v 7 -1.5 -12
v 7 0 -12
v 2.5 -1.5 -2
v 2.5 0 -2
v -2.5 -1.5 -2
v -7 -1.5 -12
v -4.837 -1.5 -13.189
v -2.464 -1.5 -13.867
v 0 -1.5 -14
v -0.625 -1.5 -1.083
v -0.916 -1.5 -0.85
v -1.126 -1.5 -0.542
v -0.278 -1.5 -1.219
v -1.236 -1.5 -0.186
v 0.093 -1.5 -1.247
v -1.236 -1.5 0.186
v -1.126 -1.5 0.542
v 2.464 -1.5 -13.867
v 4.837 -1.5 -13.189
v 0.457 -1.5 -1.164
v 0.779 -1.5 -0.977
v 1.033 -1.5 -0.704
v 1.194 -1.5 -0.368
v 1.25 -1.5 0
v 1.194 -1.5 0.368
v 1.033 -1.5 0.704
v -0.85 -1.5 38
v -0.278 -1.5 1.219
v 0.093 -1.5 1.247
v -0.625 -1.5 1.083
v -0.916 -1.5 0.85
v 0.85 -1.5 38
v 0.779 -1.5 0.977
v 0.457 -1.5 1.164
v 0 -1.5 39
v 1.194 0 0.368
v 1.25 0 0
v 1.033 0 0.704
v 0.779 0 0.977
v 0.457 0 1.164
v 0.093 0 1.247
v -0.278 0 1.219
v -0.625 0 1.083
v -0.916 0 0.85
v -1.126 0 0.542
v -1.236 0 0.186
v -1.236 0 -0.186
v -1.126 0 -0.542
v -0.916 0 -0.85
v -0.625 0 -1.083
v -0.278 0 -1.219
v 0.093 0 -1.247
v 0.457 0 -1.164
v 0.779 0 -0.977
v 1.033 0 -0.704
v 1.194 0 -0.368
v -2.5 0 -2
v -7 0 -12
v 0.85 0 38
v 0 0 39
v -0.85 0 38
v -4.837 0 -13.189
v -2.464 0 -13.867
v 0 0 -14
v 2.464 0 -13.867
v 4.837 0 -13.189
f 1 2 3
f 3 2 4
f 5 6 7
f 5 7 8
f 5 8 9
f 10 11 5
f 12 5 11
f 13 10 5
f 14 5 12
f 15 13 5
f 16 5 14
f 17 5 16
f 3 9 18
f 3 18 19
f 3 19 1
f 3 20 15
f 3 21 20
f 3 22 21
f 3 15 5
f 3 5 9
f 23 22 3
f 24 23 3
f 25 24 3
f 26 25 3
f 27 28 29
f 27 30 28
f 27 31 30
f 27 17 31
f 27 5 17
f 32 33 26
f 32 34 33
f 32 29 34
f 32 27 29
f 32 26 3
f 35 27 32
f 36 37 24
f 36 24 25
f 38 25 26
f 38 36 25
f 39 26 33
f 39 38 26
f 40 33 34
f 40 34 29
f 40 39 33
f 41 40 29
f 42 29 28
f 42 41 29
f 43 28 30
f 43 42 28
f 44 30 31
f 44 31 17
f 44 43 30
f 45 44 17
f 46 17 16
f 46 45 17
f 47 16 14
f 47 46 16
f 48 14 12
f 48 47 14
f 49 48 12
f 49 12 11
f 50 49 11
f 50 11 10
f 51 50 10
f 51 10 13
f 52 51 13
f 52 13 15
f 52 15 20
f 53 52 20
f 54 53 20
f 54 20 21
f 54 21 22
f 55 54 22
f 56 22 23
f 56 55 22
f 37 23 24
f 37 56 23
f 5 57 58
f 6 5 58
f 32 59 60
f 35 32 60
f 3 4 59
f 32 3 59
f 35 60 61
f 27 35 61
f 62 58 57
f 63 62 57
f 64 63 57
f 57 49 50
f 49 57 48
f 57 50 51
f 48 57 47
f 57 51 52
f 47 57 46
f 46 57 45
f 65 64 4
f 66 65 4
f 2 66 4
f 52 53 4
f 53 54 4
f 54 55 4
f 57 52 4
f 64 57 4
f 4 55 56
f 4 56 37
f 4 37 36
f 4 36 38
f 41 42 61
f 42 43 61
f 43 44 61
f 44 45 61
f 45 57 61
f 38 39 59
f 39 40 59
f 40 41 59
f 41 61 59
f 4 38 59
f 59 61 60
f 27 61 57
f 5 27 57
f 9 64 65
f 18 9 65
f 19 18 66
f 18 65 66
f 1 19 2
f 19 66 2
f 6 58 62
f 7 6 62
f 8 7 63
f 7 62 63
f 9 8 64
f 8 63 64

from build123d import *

# Parameters (mm, degrees)
F0_R     = 1.25
F1_DEPTH = 1.5


with BuildPart() as f1:
    # F0 (on Front) → F1 (new body)
    with BuildSketch(Plane.XZ):
        with BuildLine():
            Line((0.85, 38), (0, 39))
            Line((0, 39), (-0.85, 38))
            Line((-0.85, 38), (-2.5, -2))
            Line((-2.5, -2), (-7, -12))
            ThreePointArc((-7, -12), (-3.669946, -13.59481), (0, -14))
            ThreePointArc((0, -14), (3.669946, -13.59481), (7, -12))
            Line((7, -12), (2.5, -2))
            Line((2.5, -2), (0.85, 38))
        make_face()
        Circle(F0_R, mode=Mode.SUBTRACT)
    extrude(amount=F1_DEPTH)


solid = f1.part
